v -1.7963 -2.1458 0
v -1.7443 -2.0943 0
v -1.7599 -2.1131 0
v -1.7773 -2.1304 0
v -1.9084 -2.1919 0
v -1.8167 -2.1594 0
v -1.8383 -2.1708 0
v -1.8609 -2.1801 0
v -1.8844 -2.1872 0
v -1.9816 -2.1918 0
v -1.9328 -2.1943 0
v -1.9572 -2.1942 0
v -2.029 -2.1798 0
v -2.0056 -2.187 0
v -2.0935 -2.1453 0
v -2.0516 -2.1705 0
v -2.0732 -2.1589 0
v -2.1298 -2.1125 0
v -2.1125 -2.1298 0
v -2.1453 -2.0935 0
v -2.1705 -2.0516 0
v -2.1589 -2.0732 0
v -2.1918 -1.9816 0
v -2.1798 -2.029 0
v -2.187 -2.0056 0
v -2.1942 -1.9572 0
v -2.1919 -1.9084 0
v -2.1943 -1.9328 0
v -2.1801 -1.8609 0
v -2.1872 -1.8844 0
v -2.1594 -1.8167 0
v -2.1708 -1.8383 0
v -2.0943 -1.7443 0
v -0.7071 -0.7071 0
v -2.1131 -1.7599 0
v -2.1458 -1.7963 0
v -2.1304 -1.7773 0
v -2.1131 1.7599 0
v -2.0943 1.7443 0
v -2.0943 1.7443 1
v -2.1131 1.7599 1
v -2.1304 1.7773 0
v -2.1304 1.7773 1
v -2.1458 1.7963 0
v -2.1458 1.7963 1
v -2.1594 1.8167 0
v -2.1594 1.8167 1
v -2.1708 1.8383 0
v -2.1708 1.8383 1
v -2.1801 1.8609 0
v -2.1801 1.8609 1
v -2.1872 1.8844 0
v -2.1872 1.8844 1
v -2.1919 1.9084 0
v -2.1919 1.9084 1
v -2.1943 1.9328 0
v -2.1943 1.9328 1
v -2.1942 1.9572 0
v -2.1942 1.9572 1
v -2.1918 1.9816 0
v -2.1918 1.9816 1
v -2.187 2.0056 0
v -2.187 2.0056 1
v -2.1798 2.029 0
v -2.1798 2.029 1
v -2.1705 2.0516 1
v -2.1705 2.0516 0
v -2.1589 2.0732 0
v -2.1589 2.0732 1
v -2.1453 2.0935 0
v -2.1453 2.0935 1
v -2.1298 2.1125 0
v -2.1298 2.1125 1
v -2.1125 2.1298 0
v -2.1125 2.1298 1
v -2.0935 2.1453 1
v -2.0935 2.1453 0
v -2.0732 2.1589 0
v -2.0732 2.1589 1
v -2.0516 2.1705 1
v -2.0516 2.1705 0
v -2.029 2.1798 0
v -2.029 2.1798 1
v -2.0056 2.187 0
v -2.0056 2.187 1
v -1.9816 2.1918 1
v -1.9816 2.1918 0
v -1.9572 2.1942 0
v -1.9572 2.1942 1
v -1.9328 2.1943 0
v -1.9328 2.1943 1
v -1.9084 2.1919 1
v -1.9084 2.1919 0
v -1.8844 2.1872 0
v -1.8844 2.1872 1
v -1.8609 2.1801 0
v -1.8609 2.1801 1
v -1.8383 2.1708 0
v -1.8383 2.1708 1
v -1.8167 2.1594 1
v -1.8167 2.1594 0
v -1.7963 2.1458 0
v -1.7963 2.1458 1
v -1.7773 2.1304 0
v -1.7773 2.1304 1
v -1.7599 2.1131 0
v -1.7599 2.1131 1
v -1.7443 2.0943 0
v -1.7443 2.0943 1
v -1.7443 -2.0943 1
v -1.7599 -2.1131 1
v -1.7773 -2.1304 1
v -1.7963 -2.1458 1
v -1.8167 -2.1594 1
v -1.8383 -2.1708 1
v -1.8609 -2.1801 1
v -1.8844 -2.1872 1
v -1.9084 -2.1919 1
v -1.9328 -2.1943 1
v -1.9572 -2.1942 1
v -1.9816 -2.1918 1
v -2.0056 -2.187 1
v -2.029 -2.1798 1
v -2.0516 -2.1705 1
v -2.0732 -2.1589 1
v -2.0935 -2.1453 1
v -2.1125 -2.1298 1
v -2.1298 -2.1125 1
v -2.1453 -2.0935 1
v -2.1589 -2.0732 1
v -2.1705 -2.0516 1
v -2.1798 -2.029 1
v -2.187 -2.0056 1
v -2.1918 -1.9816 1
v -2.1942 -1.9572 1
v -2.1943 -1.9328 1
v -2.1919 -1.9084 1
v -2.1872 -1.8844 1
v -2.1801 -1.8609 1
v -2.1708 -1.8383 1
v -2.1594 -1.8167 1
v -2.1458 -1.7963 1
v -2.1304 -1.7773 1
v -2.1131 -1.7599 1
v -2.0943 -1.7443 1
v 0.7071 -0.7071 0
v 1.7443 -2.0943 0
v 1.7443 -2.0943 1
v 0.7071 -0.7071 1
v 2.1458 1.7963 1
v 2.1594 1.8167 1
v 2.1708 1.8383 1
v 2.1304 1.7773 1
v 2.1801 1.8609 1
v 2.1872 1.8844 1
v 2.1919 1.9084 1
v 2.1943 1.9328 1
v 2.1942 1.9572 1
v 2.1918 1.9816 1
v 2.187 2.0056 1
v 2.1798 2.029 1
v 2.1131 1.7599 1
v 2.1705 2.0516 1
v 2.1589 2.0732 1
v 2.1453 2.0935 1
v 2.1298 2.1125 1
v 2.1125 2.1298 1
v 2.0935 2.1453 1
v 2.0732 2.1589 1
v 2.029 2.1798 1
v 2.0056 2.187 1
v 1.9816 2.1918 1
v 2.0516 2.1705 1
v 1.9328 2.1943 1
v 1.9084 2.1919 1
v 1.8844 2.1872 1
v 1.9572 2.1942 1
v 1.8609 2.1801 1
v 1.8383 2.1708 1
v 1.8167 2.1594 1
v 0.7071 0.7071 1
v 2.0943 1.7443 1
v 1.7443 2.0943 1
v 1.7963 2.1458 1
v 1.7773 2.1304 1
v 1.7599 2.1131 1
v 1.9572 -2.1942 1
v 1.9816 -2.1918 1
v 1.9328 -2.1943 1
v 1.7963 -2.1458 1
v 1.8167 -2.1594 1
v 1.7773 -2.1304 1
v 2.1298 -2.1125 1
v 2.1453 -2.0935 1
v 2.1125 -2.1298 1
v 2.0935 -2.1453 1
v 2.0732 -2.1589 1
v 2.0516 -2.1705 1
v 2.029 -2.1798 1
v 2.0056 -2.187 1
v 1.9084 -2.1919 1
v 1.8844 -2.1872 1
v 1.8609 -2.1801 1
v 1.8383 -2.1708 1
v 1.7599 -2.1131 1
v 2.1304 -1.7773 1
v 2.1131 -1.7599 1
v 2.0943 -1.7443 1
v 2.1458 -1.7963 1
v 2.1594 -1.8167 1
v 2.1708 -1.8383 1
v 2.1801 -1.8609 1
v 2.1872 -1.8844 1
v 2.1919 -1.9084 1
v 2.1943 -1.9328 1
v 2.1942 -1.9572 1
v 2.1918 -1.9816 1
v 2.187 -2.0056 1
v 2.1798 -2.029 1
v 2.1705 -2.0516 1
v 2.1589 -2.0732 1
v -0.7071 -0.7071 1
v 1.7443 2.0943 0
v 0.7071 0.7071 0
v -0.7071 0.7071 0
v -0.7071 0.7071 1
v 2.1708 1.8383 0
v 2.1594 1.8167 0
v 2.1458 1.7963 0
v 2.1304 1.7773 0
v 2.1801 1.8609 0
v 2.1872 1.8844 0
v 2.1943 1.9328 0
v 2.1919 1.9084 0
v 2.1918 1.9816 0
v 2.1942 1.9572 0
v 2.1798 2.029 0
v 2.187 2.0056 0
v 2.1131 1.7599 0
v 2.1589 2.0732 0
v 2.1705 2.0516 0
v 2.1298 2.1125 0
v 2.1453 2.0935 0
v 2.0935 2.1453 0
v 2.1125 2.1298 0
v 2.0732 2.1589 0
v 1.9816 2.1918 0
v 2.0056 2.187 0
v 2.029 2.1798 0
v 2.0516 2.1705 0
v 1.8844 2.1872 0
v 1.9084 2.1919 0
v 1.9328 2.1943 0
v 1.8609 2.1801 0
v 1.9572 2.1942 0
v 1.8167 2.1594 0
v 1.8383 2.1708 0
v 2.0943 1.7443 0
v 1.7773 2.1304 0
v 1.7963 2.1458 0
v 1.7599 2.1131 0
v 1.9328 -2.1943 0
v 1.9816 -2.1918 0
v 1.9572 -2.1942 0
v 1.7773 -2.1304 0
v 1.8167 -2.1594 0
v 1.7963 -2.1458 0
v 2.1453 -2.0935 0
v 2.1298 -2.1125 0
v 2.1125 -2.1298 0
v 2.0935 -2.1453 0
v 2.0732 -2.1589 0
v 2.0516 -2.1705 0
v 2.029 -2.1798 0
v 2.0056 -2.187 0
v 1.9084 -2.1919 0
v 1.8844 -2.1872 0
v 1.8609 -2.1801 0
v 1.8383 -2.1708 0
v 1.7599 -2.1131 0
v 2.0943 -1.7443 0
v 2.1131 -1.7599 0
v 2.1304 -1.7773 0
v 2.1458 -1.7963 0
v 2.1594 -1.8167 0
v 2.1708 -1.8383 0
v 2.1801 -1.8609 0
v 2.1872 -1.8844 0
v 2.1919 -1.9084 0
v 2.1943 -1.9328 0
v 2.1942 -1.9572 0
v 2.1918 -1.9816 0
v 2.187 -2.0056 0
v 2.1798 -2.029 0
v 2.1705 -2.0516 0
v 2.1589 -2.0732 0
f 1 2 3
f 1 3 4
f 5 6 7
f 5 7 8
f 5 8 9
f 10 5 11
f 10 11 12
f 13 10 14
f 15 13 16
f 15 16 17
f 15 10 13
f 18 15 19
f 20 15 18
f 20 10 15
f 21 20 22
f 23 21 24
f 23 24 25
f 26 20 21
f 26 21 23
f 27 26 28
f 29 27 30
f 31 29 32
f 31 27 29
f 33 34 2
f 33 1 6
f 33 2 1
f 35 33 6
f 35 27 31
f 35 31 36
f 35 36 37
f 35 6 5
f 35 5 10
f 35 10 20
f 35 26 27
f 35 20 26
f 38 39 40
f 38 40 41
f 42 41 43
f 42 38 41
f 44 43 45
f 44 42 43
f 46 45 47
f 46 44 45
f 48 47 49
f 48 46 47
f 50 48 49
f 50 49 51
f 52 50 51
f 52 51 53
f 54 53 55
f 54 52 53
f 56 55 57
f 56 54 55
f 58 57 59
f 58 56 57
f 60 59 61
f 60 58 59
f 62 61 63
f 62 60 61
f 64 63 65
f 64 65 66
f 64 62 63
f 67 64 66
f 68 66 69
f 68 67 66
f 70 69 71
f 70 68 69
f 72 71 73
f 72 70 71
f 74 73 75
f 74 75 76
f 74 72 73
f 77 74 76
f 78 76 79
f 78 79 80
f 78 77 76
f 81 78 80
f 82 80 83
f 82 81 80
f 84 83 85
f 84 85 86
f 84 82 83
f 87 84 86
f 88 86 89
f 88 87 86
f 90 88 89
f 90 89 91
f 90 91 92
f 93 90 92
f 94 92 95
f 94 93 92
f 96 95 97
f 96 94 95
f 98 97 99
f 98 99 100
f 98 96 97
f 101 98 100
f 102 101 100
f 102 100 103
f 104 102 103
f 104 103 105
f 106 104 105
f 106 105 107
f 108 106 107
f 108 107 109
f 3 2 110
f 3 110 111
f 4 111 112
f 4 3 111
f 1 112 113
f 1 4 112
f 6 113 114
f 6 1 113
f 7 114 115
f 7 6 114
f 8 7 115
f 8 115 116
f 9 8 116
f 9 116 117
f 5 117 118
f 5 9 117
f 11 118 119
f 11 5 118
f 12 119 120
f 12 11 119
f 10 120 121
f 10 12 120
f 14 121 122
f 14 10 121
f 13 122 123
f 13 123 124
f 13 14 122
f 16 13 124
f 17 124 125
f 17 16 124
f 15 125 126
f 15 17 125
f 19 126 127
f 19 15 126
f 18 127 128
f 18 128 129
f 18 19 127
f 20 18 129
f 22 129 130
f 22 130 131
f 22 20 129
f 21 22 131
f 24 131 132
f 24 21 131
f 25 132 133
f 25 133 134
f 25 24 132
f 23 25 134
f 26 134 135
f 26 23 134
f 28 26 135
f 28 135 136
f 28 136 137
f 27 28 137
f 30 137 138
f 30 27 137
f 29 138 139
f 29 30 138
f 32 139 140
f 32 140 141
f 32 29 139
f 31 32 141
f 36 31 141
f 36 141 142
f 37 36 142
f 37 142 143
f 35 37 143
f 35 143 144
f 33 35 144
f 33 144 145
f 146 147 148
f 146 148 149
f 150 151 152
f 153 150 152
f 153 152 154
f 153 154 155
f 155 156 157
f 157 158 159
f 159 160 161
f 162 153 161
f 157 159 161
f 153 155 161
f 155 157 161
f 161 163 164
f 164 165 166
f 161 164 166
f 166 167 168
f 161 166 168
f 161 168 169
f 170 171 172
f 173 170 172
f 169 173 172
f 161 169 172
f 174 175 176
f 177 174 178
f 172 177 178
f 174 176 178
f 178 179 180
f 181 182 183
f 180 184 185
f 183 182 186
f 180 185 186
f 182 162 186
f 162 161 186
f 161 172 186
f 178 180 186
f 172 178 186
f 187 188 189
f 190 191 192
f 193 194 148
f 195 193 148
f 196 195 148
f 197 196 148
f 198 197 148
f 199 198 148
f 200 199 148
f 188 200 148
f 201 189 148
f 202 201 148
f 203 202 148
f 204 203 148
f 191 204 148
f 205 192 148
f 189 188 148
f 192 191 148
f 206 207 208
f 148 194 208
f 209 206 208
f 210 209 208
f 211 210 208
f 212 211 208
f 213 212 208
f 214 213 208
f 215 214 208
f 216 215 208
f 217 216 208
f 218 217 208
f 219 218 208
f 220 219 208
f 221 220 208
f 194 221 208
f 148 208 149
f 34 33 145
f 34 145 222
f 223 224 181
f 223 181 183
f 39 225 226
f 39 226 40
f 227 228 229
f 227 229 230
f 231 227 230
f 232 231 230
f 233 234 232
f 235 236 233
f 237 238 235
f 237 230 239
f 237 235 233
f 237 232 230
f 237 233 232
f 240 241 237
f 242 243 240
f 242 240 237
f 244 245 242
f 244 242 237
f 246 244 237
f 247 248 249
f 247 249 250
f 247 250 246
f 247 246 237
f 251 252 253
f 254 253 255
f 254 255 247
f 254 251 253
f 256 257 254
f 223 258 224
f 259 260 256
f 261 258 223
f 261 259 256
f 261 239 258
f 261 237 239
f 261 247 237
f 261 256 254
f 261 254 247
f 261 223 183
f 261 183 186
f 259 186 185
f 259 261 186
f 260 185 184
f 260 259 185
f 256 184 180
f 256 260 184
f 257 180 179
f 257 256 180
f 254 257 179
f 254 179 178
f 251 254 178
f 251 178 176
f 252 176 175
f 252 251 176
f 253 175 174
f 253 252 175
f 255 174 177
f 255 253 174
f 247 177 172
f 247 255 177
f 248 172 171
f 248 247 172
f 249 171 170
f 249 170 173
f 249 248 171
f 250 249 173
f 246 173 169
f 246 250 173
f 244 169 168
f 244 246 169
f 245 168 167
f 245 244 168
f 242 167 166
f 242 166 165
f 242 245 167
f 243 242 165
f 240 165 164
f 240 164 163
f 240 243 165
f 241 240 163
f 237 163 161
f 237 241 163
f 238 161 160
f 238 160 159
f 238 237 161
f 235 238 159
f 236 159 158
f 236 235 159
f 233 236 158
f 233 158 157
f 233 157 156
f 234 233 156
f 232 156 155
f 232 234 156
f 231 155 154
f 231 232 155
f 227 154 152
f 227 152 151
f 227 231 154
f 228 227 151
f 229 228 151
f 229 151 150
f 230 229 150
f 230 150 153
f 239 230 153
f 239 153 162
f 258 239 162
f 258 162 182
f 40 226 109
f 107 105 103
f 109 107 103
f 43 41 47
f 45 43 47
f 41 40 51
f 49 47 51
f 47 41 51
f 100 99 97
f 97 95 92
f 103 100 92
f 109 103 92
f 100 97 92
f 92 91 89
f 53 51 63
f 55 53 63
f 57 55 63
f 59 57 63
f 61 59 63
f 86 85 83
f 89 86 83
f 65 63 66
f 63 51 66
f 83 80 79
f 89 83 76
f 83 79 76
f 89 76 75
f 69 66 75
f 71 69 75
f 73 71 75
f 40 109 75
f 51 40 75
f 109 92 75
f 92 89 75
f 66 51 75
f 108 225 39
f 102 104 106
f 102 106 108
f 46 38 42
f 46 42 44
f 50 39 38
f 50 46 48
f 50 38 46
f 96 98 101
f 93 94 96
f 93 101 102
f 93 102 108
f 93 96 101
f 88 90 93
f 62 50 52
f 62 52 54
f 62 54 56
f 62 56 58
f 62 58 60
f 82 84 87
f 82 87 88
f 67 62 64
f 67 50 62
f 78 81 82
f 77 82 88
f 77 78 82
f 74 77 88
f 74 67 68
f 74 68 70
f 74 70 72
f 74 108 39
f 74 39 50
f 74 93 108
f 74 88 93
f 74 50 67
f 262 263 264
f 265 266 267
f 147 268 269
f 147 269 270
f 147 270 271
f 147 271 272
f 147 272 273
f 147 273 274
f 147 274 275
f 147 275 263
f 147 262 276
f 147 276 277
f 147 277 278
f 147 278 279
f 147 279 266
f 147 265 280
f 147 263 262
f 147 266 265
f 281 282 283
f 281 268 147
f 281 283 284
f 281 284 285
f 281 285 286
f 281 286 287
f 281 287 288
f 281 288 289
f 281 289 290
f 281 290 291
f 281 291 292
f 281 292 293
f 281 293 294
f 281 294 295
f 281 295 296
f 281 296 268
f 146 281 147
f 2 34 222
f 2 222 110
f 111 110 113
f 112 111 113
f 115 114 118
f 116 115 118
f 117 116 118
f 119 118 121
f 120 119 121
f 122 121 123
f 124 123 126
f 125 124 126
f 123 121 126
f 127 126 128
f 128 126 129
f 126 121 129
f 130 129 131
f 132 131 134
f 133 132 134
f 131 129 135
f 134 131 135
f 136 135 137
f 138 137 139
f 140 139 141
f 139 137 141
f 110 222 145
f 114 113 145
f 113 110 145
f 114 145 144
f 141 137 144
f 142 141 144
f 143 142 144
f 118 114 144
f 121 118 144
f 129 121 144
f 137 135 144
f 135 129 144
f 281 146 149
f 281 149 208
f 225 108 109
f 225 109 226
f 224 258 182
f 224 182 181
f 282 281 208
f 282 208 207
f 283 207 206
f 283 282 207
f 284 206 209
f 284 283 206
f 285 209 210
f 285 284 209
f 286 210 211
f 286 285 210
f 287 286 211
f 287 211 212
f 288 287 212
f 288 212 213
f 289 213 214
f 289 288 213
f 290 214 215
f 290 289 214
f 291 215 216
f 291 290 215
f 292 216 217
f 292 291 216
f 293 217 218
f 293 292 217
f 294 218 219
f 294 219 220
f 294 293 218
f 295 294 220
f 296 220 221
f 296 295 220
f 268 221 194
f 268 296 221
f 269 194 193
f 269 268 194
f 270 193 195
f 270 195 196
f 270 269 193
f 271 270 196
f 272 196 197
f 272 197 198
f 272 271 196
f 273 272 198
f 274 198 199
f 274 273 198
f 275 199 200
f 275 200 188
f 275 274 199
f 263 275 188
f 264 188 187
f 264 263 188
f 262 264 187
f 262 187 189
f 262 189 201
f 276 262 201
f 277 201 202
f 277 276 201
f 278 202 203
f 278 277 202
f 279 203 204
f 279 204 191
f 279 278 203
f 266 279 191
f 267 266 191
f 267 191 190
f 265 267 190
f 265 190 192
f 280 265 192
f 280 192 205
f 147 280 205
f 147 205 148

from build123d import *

# Parameters (mm, degrees)
BOSS_EXTRUDE1_DEPTH   = 1
BOSS_EXTRUDE1_2_DEPTH = 1
BOSS_EXTRUDE1_3_DEPTH = 1
BOSS_EXTRUDE1_4_DEPTH = 1


with BuildPart() as part:
    # Sketch1 → Boss-Extrude1 (new body)
    with BuildSketch(Plane.XY):
        with BuildLine():
            Line((0.707106781, 0.707106781), (1.744326282, 2.094253388))
            ThreePointArc((1.744326282, 2.094253388), (2.121320344, 2.121320344), (2.094253388, 1.744326282))
            Line((2.094253388, 1.744326282), (0.707106781, 0.707106781))
        make_face()
    extrude(amount=BOSS_EXTRUDE1_DEPTH)


with BuildPart() as body_2:
    # Sketch1 → Boss-Extrude1 2 (new body)
    with BuildSketch(Plane.XY):
        with BuildLine():
            Line((1.744326282, -2.094253388), (0.707106781, -0.707106781))
            Line((0.707106781, -0.707106781), (2.094253388, -1.744326282))
            ThreePointArc((2.094253388, -1.744326282), (2.121320344, -2.121320344), (1.744326282, -2.094253388))
        make_face()
    extrude(amount=BOSS_EXTRUDE1_2_DEPTH)


with BuildPart() as body_3:
    # Sketch1 → Boss-Extrude1 3 (new body)
    with BuildSketch(Plane.XY):
        with BuildLine():
            Line((-2.094253388, -1.744326282), (-0.707106781, -0.707106781))
            Line((-0.707106781, -0.707106781), (-1.744326282, -2.094253388))
            ThreePointArc((-1.744326282, -2.094253388), (-2.121320344, -2.121320344), (-2.094253388, -1.744326282))
        make_face()
    extrude(amount=BOSS_EXTRUDE1_3_DEPTH)


with BuildPart() as body_4:
    # Sketch1 → Boss-Extrude1 4 (new body)
    with BuildSketch(Plane.XY):
        with BuildLine():
            Line((-1.744326282, 2.094253388), (-0.707106781, 0.707106781))
            Line((-0.707106781, 0.707106781), (-2.094253388, 1.744326282))
            ThreePointArc((-2.094253388, 1.744326282), (-2.121320344, 2.121320344), (-1.744326282, 2.094253388))
        make_face()
    extrude(amount=BOSS_EXTRUDE1_4_DEPTH)


solid = Compound([part.part, body_2.part, body_3.part, body_4.part])
